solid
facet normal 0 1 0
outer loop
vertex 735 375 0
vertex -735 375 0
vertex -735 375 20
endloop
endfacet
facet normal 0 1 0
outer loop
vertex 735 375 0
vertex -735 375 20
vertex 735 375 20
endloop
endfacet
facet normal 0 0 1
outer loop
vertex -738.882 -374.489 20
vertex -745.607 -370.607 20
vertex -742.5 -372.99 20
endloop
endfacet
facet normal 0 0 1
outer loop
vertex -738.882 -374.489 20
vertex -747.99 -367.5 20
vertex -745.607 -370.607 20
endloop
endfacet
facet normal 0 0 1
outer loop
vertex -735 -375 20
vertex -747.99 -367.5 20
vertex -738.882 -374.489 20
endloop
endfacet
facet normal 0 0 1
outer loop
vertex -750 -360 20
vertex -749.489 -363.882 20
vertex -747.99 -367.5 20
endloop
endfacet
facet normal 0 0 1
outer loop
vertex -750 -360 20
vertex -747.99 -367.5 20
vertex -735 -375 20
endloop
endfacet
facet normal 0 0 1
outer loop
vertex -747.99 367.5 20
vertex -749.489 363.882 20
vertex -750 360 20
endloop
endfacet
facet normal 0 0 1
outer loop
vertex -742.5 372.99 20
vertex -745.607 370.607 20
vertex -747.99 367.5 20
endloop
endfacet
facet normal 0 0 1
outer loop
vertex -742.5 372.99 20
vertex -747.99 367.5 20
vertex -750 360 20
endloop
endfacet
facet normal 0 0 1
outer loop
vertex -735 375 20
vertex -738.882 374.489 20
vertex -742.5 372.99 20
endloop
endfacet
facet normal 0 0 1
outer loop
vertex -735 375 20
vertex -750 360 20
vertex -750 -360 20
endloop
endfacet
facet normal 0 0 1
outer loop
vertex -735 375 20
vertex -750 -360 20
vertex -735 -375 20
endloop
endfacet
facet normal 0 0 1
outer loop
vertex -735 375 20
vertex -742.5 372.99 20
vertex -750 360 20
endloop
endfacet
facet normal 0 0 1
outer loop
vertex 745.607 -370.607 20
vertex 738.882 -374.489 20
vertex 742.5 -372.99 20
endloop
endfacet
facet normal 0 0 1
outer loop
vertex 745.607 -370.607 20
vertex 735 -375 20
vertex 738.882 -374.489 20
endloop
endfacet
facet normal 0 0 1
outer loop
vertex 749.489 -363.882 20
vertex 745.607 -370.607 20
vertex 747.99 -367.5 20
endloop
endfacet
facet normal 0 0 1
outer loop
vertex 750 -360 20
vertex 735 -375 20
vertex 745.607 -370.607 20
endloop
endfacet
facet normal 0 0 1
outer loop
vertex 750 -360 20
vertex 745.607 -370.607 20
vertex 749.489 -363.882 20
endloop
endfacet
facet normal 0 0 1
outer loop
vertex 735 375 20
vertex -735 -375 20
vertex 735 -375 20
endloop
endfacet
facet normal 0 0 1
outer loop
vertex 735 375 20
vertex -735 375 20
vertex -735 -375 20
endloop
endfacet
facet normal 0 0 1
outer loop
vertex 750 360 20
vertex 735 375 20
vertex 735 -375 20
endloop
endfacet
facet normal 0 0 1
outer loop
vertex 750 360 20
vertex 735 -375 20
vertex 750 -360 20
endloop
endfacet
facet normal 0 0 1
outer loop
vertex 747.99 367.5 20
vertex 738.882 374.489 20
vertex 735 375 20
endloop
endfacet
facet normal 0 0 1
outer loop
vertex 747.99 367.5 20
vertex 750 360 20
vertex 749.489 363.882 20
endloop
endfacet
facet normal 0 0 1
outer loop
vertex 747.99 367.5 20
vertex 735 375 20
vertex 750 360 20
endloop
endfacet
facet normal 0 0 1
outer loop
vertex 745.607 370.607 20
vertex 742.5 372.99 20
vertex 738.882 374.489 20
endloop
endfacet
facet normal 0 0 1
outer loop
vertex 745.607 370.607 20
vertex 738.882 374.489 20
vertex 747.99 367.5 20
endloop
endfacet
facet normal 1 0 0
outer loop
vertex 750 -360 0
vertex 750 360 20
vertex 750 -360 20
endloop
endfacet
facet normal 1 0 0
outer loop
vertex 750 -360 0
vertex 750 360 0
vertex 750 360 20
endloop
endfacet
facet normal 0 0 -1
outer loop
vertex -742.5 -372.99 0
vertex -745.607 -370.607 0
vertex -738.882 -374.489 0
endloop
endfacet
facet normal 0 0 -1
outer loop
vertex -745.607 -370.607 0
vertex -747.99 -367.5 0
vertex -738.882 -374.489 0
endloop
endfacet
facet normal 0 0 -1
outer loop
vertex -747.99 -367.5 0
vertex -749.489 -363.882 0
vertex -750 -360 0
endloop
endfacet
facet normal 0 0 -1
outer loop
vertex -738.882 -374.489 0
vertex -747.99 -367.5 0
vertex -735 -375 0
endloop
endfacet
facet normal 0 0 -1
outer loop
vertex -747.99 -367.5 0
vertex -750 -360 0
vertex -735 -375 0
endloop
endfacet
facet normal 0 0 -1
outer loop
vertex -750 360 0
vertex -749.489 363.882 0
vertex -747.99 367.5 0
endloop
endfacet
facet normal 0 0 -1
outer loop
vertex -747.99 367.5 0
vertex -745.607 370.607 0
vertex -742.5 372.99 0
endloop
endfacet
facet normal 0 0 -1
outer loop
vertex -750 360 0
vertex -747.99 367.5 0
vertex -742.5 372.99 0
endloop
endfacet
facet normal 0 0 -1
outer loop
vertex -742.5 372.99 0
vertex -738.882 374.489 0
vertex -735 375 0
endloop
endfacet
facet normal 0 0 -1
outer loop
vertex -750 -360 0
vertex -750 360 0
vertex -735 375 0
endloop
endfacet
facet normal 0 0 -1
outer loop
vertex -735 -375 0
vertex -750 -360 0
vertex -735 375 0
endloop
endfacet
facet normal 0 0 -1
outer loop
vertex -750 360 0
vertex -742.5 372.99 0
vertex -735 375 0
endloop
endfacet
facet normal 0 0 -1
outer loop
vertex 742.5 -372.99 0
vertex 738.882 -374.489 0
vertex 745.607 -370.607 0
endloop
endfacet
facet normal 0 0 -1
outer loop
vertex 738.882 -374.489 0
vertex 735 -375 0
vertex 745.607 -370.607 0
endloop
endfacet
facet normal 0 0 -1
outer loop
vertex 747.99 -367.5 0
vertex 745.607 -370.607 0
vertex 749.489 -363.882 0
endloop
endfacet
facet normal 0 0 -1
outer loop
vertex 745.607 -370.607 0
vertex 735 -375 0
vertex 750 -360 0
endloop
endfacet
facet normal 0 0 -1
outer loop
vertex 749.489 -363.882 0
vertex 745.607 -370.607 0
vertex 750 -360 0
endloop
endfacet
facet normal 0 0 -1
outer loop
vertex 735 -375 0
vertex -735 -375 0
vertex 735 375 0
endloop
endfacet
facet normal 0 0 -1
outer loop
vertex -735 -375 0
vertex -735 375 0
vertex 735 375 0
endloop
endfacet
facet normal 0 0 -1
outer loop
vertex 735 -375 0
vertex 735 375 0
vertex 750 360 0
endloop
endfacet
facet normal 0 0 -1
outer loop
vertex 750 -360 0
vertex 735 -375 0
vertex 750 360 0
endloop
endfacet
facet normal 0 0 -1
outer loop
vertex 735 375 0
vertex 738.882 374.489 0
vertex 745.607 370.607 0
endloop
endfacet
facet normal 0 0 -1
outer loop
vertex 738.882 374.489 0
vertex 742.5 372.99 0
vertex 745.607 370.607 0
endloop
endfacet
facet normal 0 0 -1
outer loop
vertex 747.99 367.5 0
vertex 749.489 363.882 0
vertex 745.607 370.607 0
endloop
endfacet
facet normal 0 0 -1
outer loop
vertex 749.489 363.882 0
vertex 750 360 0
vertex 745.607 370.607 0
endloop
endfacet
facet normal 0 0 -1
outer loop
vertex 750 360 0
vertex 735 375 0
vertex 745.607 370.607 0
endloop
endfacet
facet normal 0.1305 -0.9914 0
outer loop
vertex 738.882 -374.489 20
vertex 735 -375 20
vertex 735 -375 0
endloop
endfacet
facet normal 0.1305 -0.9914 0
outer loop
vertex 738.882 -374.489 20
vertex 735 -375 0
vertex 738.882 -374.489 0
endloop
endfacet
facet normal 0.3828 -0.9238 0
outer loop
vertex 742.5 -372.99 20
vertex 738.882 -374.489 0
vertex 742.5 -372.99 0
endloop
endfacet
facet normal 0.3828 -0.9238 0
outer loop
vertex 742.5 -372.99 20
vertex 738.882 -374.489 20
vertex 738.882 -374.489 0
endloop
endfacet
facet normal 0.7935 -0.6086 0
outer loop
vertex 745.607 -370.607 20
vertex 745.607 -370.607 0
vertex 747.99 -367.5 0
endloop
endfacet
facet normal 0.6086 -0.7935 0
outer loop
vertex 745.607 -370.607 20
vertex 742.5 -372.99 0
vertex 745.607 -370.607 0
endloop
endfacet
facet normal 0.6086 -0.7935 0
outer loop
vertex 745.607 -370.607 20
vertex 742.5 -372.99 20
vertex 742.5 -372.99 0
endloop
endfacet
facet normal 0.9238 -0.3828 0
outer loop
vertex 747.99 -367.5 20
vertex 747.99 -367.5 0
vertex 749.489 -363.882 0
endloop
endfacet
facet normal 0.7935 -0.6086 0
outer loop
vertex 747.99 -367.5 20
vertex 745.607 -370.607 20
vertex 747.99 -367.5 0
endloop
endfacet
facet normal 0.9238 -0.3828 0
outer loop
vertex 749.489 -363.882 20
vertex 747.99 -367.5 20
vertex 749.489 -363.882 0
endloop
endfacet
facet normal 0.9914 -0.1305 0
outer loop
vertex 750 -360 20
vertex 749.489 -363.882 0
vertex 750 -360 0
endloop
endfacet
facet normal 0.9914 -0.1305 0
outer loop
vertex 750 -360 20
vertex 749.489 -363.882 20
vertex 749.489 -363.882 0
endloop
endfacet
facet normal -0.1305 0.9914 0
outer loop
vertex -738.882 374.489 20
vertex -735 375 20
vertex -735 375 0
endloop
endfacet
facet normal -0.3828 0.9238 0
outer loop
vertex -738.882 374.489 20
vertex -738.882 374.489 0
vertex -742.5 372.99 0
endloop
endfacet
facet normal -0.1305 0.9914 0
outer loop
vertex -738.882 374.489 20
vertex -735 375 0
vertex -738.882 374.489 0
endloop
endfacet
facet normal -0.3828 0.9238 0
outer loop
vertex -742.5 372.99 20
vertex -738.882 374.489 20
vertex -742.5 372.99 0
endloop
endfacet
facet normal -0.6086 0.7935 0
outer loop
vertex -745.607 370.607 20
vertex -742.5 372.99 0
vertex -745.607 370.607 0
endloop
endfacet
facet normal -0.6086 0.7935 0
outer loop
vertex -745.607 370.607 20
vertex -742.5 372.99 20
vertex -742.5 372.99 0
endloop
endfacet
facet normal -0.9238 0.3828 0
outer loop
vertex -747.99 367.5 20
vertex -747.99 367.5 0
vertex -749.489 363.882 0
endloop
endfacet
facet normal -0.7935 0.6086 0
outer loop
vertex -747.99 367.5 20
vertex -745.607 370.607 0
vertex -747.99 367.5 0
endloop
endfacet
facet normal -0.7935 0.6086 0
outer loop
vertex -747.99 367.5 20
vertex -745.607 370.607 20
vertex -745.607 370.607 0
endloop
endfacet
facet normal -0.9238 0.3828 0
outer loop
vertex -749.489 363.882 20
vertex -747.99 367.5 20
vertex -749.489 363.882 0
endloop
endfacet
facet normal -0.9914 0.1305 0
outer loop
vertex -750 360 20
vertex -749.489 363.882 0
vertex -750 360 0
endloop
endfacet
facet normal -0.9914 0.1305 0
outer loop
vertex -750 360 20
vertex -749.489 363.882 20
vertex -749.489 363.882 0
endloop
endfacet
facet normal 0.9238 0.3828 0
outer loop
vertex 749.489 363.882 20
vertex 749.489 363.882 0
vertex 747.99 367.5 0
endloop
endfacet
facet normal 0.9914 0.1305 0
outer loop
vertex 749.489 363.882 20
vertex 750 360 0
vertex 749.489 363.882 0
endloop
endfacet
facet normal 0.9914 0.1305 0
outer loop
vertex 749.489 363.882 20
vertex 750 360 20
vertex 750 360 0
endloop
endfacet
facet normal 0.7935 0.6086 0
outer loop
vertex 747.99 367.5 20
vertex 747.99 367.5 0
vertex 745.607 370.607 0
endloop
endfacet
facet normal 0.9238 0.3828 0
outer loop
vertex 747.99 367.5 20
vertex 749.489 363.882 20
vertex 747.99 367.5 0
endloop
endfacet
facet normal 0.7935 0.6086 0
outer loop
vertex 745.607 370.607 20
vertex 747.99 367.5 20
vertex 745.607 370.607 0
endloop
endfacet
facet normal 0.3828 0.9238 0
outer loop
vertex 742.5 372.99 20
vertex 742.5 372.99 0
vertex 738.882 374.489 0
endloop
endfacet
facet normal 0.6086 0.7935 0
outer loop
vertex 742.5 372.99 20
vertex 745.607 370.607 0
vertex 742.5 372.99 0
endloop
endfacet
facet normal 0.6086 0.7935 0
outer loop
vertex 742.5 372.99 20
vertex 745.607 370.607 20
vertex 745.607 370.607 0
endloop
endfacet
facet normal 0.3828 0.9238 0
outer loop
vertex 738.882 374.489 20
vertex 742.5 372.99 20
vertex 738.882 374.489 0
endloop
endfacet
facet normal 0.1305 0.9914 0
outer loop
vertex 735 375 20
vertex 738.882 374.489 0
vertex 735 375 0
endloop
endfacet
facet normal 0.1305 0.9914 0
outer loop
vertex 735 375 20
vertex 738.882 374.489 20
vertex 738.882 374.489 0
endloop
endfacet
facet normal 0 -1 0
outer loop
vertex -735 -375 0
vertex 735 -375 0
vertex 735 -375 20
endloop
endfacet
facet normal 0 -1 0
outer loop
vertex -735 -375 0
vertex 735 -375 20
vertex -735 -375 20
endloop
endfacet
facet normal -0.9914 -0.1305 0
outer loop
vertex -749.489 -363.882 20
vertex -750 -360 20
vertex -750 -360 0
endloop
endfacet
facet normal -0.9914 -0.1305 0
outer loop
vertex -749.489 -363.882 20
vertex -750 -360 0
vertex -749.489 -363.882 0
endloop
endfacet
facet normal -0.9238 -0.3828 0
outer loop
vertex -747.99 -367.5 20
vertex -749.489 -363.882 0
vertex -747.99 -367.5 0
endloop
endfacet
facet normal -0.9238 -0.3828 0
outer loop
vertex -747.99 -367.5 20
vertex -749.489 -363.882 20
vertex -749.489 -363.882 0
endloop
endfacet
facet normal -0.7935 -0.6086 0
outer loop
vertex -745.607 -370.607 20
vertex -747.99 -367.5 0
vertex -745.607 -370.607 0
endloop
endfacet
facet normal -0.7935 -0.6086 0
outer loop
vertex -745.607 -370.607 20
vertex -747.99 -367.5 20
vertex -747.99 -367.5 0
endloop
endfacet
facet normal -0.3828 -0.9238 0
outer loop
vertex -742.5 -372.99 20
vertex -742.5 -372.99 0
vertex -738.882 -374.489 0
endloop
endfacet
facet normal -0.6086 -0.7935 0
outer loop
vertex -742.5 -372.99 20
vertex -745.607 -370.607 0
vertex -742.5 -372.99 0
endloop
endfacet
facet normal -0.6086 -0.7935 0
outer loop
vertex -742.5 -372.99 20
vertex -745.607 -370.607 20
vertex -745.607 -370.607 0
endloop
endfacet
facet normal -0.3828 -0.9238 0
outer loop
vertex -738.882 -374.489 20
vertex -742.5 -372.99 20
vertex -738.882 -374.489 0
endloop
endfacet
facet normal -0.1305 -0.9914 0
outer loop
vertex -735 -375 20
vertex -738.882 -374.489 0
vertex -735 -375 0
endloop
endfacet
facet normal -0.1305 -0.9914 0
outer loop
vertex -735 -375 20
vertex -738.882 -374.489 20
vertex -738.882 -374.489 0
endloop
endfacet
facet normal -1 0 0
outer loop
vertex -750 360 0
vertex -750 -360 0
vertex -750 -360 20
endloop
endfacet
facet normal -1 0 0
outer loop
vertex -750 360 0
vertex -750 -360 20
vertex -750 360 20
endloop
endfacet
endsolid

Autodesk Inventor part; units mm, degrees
sketch "Sketch2" plane through (0, 0, 0) normal (0, 0, 1) x (1, 0, 0)
  line L0 (750, -375) -> (-750, -375)
  line L1 (-750, -375) -> (-750, 375)
  line L2 (-750, 375) -> (750, 375)
  line L3 (750, 375) -> (750, -375)
  line L4 (750, -375) -> (-750, 375) construction
  line L5 (-750, -375) -> (750, 375) construction
  point P0 (0, 0)
  dimension "d0" = 1500
  dimension "d1" = 750
extrude "Extrusion1" add sketch "Sketch2" along normal blind 20
fillet "Fillet1" radius 15 1 edges at (-750, 375, 10)
fillet "Fillet2" radius 15 1 edges at (750, 375, 10)
fillet "Fillet3" radius 15 1 edges at (750, -375, 10)
fillet "Fillet4" radius 15 1 edges at (-750, -375, 10)
properties part number "Mesa_001_0001"
